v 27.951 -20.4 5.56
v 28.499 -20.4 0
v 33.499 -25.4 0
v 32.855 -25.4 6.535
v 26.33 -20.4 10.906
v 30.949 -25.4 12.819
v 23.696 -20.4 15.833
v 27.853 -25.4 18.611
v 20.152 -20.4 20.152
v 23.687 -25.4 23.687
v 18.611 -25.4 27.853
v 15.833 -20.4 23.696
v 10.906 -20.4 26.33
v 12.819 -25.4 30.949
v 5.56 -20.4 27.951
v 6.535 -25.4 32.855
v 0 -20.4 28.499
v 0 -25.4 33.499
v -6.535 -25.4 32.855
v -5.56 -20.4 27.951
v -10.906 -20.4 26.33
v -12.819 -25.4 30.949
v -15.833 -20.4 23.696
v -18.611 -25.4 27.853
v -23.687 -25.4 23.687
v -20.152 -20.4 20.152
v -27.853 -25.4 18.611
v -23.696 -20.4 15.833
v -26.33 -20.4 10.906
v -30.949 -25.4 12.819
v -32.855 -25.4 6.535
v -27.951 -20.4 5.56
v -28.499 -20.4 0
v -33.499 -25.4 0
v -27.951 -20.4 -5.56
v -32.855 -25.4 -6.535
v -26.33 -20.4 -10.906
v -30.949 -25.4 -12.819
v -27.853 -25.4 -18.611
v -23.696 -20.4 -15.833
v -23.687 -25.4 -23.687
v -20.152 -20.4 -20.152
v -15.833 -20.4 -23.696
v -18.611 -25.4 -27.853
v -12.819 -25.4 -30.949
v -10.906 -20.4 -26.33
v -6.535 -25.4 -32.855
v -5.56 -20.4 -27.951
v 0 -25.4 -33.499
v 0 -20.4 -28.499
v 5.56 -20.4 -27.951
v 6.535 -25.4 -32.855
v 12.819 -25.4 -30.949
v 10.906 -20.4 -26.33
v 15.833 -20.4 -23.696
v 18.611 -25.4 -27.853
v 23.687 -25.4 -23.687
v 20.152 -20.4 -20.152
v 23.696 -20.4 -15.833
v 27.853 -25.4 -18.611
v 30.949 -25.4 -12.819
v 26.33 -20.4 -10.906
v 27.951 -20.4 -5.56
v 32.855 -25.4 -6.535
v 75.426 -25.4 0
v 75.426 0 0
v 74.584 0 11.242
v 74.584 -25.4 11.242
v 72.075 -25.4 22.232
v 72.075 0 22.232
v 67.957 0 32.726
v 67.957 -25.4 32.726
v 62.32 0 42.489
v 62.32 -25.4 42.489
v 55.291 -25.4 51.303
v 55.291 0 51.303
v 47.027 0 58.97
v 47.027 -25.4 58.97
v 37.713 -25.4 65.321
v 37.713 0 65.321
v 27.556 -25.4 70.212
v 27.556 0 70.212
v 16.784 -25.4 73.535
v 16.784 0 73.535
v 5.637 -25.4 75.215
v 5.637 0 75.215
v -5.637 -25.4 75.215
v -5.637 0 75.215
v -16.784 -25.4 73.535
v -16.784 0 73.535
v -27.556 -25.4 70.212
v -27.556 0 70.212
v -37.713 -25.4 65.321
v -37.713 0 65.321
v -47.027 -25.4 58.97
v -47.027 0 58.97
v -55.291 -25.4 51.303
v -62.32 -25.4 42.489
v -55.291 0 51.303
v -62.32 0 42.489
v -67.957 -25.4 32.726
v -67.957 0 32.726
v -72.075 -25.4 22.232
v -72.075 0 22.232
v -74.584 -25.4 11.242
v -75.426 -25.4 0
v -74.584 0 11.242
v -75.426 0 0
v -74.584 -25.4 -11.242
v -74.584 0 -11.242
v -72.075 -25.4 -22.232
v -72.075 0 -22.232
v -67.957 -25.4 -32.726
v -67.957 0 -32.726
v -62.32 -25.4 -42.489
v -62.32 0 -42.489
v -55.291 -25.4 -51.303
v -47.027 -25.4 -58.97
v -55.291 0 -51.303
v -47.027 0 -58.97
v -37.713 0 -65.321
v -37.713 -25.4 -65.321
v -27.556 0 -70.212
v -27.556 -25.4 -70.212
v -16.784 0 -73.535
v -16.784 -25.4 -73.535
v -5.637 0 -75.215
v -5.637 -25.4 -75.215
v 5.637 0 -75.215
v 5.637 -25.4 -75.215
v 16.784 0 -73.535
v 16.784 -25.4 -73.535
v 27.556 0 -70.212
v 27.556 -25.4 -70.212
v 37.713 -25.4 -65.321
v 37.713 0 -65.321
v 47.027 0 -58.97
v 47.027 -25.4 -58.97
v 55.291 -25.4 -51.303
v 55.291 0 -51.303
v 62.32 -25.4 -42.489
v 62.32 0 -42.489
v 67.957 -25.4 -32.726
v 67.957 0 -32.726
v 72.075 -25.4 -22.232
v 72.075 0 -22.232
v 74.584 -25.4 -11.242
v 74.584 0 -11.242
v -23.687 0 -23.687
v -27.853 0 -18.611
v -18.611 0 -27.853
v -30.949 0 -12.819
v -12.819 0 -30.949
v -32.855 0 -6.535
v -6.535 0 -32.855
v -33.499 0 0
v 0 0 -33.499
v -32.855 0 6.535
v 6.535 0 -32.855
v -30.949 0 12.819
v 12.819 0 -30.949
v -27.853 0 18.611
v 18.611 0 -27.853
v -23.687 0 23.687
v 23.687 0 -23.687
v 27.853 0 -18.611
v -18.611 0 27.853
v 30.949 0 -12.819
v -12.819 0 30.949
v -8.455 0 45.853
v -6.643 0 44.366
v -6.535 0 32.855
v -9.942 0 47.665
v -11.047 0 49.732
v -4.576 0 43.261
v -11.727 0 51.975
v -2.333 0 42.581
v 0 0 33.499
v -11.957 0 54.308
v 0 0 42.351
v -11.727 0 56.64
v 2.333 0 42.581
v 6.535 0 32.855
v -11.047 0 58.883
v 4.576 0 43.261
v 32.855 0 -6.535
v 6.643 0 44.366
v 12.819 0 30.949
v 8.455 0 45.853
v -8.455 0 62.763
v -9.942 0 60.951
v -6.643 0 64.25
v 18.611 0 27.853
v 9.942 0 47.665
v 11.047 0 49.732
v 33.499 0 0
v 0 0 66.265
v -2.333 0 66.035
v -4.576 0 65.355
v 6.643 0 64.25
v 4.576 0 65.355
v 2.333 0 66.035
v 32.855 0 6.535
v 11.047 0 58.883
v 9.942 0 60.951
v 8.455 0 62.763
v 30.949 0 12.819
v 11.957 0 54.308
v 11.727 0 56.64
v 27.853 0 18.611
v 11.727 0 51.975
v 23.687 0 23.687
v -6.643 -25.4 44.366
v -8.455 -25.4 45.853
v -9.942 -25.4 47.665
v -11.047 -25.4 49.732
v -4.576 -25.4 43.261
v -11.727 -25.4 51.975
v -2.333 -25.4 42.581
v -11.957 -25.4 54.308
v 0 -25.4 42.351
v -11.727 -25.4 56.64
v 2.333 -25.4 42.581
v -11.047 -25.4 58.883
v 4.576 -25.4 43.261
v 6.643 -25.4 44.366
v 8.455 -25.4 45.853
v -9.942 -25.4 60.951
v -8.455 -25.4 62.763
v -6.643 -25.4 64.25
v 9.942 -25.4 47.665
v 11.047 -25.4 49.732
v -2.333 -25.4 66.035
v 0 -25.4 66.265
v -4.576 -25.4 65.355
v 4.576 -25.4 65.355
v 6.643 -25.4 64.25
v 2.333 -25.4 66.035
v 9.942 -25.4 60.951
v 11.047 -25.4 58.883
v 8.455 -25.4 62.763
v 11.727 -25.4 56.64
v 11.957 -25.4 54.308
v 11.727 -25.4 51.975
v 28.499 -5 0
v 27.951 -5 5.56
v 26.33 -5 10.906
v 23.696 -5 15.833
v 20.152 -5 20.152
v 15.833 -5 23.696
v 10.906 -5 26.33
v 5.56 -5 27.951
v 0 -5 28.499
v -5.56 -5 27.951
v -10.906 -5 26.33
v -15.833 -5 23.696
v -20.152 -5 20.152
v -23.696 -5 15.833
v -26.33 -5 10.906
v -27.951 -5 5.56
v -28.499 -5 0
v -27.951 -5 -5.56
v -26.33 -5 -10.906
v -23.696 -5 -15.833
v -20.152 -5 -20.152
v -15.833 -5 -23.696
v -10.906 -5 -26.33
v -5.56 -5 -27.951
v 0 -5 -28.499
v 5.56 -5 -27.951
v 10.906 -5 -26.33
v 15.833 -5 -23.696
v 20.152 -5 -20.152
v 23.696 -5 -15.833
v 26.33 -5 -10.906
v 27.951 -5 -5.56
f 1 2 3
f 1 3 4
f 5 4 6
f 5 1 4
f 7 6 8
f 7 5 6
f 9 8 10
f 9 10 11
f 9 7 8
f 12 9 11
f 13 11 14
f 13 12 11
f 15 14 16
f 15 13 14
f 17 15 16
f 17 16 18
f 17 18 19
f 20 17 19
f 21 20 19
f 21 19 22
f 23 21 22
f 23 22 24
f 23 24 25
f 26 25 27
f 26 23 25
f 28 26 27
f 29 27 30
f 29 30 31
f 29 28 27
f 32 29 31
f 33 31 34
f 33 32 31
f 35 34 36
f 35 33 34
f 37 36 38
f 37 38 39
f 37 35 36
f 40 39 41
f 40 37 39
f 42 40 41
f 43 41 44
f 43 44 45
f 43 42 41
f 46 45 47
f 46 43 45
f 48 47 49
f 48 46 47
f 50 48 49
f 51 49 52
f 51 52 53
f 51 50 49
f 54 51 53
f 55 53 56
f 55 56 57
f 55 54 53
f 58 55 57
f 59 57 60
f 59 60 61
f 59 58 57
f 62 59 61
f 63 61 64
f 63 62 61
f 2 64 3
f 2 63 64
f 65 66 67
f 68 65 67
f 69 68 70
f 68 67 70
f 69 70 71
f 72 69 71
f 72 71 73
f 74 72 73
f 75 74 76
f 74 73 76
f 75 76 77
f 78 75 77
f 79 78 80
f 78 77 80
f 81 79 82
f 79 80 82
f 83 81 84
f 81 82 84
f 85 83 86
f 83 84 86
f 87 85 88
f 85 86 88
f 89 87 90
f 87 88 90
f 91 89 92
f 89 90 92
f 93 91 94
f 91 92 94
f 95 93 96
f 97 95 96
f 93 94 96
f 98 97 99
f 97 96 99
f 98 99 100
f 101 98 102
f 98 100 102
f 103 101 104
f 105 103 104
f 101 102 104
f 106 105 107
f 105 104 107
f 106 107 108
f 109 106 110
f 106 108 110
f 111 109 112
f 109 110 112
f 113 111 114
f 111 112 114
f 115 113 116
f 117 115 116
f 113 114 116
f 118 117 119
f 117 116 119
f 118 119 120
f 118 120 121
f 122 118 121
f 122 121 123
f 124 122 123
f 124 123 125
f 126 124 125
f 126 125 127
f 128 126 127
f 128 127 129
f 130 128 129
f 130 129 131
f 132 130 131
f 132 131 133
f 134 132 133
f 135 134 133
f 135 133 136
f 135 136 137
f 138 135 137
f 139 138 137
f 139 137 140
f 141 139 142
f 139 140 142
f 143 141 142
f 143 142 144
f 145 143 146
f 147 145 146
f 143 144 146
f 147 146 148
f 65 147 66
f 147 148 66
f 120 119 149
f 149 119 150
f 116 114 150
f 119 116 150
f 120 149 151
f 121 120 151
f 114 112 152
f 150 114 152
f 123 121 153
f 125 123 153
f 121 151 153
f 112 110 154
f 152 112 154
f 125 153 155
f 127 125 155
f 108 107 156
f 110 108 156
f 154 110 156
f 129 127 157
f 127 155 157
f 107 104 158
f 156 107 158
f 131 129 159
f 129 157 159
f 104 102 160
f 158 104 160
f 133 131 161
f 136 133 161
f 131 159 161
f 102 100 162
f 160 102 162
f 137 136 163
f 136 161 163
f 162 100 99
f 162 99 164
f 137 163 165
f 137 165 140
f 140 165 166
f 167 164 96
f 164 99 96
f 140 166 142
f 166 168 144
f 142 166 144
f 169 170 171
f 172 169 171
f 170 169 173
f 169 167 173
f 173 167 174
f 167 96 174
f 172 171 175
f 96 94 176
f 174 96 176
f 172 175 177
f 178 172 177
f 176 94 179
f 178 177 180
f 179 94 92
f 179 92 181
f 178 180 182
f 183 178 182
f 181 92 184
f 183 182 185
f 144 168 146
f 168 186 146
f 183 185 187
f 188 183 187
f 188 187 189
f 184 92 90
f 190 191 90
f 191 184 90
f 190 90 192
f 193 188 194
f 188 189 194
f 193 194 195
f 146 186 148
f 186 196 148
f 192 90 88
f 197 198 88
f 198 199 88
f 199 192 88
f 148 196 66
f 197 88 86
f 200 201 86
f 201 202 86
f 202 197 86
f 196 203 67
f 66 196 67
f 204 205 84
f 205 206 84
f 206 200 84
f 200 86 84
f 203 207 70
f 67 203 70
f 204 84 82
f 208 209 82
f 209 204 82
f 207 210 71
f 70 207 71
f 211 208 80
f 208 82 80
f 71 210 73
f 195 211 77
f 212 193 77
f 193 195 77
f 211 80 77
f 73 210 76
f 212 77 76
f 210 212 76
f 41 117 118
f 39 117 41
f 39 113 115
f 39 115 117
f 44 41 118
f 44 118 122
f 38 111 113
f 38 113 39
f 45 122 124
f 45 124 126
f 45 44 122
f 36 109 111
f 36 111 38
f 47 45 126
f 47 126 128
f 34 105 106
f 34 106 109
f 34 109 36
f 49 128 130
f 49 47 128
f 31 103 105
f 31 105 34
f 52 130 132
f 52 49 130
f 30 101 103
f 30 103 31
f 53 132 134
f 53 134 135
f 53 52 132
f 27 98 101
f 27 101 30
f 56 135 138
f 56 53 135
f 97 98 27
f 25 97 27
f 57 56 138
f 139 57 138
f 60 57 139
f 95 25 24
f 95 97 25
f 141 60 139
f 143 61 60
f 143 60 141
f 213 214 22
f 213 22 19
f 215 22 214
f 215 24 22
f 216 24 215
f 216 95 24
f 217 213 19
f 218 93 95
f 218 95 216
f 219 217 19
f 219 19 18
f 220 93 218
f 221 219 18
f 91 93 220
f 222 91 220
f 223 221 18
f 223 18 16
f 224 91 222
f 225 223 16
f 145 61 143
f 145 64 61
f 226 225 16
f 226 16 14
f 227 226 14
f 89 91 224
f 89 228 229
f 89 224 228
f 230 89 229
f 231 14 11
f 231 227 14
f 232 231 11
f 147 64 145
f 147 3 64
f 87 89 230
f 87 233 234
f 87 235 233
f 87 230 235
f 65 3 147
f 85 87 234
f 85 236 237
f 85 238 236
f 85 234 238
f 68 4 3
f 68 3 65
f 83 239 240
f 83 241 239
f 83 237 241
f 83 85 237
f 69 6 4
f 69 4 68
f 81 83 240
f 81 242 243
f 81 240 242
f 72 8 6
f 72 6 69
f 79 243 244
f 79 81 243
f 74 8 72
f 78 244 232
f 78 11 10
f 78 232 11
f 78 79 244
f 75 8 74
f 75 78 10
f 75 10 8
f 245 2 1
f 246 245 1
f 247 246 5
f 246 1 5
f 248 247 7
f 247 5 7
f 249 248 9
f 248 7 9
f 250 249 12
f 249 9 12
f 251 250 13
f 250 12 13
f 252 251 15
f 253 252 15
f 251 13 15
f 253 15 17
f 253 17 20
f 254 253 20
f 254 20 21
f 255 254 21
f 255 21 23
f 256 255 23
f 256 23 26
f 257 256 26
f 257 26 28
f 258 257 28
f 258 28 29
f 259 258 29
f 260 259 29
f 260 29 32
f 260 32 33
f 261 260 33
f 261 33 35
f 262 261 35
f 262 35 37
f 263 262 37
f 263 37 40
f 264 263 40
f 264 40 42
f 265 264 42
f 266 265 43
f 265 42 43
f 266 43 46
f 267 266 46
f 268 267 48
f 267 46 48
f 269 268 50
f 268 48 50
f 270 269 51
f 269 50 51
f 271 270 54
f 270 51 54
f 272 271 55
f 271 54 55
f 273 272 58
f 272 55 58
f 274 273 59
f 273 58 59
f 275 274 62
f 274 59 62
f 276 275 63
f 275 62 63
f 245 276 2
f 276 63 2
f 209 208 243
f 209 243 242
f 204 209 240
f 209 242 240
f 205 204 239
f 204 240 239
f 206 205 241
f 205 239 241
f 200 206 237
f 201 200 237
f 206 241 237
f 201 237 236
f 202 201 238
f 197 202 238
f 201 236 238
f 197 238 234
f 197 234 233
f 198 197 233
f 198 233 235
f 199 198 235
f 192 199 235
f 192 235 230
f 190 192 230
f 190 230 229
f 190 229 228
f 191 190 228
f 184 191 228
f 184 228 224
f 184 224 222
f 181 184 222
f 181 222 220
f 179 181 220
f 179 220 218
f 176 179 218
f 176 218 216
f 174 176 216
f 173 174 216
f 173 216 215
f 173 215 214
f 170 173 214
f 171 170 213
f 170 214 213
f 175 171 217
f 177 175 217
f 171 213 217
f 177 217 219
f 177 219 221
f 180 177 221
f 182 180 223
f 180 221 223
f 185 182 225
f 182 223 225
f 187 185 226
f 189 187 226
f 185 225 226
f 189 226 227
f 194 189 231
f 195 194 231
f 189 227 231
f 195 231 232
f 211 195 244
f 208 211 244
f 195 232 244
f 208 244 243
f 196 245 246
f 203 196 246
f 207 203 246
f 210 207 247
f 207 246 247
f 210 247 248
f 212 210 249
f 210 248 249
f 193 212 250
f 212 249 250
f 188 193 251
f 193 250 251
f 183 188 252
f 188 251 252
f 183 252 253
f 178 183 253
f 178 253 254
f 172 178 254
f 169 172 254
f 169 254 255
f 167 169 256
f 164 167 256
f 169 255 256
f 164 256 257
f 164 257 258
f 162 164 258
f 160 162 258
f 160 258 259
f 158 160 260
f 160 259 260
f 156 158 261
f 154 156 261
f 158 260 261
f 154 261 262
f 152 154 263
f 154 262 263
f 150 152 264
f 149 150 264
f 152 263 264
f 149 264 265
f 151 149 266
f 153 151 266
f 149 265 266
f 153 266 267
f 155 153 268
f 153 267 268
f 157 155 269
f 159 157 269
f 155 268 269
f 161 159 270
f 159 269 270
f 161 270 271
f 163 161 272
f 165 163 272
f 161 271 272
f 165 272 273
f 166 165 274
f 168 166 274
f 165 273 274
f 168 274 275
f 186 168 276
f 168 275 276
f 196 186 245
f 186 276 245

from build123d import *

# Parameters (mm, degrees)
F0_R     = 75.4260527683
F1_DEPTH = 25.4
F2_R     = 25.3745556146
F3_R     = 28.4988575913
F4_DEPTH = 80.4947149009
F6_SIZE  = 5
F7_R     = 11.9569521578
F5_DEPTH = 25.401


with BuildPart() as f1:
    # F0 (on Front) → F1 (new body)
    with BuildSketch(Plane.XZ):
        Circle(F0_R)
    extrude(amount=F1_DEPTH)

    # F2 (on face) + F3 (on face) → F4 (cut)
    with BuildSketch(Plane.XZ.offset(25.4)):
        Circle(F2_R)
    with BuildSketch(Plane.XZ.offset(25.4)):
        Circle(F3_R)
    extrude(amount=-F4_DEPTH, mode=Mode.SUBTRACT)

    # F6
    f6_edges = [f1.edges().sort_by_distance(p)[0] for p in [
        (-28.498858, -25.4, 0),
        (28.498858, -12.7, 0),
        (-28.498858, 0, 0),
    ]]
    chamfer(f6_edges, length=F6_SIZE)

    # F7 (on face) → F5 (cut, through all)
    with BuildSketch(Plane.XZ.offset(25.4)):
        with Locations((0, 54.307743907)):
            Circle(F7_R)
    extrude(amount=-F5_DEPTH, mode=Mode.SUBTRACT)


solid = f1.part
